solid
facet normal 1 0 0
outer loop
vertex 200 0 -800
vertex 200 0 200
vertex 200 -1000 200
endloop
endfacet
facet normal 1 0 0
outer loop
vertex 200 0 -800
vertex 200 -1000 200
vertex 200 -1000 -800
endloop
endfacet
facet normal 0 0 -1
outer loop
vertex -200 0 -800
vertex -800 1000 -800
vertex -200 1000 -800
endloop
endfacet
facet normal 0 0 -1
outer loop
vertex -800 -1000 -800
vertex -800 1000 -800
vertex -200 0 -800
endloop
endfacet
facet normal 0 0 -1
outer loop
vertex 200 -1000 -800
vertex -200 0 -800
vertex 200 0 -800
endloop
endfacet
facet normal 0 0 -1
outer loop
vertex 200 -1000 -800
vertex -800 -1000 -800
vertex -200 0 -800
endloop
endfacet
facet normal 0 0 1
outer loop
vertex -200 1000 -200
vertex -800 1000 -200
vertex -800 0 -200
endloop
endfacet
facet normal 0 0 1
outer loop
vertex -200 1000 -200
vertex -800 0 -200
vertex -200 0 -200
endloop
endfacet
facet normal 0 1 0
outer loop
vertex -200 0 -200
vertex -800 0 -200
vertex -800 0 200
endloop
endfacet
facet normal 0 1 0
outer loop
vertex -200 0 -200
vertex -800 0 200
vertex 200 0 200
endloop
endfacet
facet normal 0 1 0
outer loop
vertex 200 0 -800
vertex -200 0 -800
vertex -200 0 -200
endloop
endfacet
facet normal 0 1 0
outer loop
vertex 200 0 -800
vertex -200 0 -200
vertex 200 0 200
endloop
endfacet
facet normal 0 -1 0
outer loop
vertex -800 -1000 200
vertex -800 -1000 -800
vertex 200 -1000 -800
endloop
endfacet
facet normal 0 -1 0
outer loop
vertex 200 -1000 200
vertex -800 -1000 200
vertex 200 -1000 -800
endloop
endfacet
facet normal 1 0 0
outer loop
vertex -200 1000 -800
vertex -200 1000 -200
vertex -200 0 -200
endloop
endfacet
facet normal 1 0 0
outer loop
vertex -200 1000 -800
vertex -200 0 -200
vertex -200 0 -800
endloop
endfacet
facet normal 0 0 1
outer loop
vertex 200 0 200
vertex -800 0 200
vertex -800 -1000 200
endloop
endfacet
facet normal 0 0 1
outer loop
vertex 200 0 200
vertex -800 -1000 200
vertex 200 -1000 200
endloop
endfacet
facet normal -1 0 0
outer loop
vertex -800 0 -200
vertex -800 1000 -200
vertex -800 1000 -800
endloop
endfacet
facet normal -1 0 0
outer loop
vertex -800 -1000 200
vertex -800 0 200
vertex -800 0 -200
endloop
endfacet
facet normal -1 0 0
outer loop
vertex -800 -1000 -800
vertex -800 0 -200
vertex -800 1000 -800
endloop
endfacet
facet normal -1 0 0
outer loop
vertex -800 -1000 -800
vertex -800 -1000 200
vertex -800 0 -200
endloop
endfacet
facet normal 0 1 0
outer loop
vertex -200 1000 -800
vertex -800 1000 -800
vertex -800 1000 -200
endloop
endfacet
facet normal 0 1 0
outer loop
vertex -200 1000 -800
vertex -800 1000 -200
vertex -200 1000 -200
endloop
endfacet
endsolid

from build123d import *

# Parameters (mm, degrees)
SKETCH1_W           = 1000
SKETCH1_H           = 1000
BOSS_EXTRUDE1_DEPTH = 1000
SKETCH1_3_W         = 600
SKETCH1_3_H         = 600
BOSS_EXTRUDE2_DEPTH = 1000


with BuildPart() as part:
    # Sketch1 → Boss-Extrude1 (new body)
    with BuildSketch(Plane(origin=(0, 0, 0), x_dir=(1, 0, 0), z_dir=(0, 1, 0))):
        with Locations((-300, 300)):
            Rectangle(SKETCH1_W, SKETCH1_H)
    extrude(amount=-BOSS_EXTRUDE1_DEPTH)

    # Sketch1<3> → Boss-Extrude2 (add)
    with BuildSketch(Plane(origin=(0, 0, 0), x_dir=(1, 0, 0), z_dir=(0, 1, 0))):
        with Locations((-500, 500)):
            Rectangle(SKETCH1_3_W, SKETCH1_3_H)
    extrude(amount=BOSS_EXTRUDE2_DEPTH)


solid = part.part
